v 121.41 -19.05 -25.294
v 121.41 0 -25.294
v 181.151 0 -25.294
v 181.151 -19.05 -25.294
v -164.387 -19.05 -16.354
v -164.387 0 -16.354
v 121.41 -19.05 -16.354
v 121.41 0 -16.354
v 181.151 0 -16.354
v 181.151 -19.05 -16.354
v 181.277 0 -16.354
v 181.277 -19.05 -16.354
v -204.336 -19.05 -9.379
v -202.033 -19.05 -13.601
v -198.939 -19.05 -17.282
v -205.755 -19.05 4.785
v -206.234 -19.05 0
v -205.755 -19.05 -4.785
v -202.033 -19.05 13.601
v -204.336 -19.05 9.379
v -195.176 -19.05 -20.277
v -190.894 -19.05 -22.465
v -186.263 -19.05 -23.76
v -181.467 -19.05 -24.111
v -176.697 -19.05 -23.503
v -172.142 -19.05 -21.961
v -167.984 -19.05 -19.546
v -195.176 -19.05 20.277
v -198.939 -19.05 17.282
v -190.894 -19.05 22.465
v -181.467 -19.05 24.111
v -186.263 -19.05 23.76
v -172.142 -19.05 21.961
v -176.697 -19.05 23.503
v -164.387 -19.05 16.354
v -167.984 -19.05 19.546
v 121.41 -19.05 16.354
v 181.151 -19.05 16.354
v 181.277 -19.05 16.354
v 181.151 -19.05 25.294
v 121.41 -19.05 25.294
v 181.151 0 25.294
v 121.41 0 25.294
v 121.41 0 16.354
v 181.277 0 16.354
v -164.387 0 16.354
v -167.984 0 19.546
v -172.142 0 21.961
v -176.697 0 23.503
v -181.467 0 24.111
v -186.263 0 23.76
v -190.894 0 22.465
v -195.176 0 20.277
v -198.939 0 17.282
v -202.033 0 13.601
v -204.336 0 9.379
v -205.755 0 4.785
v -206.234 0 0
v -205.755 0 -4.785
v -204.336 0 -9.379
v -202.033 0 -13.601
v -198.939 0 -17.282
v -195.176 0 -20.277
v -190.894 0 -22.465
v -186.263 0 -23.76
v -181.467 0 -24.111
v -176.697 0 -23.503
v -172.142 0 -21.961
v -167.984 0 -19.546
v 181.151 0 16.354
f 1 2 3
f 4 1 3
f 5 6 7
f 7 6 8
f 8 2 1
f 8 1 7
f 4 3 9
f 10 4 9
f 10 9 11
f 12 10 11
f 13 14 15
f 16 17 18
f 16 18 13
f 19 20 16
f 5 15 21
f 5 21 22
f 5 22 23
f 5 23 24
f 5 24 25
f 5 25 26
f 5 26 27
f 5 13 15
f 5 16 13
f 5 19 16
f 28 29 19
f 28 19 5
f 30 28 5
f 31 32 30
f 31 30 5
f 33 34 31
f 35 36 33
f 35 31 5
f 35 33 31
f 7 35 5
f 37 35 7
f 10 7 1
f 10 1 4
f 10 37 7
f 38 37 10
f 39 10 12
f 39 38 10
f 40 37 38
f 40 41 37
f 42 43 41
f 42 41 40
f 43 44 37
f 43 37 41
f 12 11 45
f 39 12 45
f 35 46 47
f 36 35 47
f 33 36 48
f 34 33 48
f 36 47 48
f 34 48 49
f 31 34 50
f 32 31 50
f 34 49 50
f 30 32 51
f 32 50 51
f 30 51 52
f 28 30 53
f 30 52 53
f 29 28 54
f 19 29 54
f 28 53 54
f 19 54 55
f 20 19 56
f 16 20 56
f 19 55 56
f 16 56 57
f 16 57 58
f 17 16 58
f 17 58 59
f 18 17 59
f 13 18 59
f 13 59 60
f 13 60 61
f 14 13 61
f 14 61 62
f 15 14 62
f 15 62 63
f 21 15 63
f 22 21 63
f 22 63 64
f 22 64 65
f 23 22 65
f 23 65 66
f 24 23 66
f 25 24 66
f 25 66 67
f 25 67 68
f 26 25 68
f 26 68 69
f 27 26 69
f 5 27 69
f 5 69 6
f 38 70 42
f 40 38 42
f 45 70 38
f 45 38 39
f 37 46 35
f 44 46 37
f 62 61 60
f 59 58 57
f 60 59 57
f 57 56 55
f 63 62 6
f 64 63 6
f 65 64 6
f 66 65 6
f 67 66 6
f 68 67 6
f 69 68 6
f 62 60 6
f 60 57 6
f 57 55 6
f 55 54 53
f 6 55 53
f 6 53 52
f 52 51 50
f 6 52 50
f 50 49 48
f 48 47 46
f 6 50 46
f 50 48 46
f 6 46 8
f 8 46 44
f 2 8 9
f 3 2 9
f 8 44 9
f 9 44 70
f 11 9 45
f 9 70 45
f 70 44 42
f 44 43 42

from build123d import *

# Parameters (mm, degrees)
F0_W     = 362.554728
F0_H     = 32.70875
F1_R     = 24.119355
F1_W     = 59.741348
F1_H     = 50.58742
F2_DEPTH = 19.05


with BuildPart() as f2:
    # F0 (on Front) + F1 (on face) → F2 (new body)
    with BuildSketch(Plane.XZ):
        Rectangle(F0_W, F0_H)
    with BuildSketch(Plane.XZ):
        with Locations((-182.114676, 0)):
            Circle(F1_R)
        with Locations((151.280463, 0)):
            Rectangle(F1_W, F1_H)
    extrude(amount=F2_DEPTH)

    # F3: union 


solid = f2.part
